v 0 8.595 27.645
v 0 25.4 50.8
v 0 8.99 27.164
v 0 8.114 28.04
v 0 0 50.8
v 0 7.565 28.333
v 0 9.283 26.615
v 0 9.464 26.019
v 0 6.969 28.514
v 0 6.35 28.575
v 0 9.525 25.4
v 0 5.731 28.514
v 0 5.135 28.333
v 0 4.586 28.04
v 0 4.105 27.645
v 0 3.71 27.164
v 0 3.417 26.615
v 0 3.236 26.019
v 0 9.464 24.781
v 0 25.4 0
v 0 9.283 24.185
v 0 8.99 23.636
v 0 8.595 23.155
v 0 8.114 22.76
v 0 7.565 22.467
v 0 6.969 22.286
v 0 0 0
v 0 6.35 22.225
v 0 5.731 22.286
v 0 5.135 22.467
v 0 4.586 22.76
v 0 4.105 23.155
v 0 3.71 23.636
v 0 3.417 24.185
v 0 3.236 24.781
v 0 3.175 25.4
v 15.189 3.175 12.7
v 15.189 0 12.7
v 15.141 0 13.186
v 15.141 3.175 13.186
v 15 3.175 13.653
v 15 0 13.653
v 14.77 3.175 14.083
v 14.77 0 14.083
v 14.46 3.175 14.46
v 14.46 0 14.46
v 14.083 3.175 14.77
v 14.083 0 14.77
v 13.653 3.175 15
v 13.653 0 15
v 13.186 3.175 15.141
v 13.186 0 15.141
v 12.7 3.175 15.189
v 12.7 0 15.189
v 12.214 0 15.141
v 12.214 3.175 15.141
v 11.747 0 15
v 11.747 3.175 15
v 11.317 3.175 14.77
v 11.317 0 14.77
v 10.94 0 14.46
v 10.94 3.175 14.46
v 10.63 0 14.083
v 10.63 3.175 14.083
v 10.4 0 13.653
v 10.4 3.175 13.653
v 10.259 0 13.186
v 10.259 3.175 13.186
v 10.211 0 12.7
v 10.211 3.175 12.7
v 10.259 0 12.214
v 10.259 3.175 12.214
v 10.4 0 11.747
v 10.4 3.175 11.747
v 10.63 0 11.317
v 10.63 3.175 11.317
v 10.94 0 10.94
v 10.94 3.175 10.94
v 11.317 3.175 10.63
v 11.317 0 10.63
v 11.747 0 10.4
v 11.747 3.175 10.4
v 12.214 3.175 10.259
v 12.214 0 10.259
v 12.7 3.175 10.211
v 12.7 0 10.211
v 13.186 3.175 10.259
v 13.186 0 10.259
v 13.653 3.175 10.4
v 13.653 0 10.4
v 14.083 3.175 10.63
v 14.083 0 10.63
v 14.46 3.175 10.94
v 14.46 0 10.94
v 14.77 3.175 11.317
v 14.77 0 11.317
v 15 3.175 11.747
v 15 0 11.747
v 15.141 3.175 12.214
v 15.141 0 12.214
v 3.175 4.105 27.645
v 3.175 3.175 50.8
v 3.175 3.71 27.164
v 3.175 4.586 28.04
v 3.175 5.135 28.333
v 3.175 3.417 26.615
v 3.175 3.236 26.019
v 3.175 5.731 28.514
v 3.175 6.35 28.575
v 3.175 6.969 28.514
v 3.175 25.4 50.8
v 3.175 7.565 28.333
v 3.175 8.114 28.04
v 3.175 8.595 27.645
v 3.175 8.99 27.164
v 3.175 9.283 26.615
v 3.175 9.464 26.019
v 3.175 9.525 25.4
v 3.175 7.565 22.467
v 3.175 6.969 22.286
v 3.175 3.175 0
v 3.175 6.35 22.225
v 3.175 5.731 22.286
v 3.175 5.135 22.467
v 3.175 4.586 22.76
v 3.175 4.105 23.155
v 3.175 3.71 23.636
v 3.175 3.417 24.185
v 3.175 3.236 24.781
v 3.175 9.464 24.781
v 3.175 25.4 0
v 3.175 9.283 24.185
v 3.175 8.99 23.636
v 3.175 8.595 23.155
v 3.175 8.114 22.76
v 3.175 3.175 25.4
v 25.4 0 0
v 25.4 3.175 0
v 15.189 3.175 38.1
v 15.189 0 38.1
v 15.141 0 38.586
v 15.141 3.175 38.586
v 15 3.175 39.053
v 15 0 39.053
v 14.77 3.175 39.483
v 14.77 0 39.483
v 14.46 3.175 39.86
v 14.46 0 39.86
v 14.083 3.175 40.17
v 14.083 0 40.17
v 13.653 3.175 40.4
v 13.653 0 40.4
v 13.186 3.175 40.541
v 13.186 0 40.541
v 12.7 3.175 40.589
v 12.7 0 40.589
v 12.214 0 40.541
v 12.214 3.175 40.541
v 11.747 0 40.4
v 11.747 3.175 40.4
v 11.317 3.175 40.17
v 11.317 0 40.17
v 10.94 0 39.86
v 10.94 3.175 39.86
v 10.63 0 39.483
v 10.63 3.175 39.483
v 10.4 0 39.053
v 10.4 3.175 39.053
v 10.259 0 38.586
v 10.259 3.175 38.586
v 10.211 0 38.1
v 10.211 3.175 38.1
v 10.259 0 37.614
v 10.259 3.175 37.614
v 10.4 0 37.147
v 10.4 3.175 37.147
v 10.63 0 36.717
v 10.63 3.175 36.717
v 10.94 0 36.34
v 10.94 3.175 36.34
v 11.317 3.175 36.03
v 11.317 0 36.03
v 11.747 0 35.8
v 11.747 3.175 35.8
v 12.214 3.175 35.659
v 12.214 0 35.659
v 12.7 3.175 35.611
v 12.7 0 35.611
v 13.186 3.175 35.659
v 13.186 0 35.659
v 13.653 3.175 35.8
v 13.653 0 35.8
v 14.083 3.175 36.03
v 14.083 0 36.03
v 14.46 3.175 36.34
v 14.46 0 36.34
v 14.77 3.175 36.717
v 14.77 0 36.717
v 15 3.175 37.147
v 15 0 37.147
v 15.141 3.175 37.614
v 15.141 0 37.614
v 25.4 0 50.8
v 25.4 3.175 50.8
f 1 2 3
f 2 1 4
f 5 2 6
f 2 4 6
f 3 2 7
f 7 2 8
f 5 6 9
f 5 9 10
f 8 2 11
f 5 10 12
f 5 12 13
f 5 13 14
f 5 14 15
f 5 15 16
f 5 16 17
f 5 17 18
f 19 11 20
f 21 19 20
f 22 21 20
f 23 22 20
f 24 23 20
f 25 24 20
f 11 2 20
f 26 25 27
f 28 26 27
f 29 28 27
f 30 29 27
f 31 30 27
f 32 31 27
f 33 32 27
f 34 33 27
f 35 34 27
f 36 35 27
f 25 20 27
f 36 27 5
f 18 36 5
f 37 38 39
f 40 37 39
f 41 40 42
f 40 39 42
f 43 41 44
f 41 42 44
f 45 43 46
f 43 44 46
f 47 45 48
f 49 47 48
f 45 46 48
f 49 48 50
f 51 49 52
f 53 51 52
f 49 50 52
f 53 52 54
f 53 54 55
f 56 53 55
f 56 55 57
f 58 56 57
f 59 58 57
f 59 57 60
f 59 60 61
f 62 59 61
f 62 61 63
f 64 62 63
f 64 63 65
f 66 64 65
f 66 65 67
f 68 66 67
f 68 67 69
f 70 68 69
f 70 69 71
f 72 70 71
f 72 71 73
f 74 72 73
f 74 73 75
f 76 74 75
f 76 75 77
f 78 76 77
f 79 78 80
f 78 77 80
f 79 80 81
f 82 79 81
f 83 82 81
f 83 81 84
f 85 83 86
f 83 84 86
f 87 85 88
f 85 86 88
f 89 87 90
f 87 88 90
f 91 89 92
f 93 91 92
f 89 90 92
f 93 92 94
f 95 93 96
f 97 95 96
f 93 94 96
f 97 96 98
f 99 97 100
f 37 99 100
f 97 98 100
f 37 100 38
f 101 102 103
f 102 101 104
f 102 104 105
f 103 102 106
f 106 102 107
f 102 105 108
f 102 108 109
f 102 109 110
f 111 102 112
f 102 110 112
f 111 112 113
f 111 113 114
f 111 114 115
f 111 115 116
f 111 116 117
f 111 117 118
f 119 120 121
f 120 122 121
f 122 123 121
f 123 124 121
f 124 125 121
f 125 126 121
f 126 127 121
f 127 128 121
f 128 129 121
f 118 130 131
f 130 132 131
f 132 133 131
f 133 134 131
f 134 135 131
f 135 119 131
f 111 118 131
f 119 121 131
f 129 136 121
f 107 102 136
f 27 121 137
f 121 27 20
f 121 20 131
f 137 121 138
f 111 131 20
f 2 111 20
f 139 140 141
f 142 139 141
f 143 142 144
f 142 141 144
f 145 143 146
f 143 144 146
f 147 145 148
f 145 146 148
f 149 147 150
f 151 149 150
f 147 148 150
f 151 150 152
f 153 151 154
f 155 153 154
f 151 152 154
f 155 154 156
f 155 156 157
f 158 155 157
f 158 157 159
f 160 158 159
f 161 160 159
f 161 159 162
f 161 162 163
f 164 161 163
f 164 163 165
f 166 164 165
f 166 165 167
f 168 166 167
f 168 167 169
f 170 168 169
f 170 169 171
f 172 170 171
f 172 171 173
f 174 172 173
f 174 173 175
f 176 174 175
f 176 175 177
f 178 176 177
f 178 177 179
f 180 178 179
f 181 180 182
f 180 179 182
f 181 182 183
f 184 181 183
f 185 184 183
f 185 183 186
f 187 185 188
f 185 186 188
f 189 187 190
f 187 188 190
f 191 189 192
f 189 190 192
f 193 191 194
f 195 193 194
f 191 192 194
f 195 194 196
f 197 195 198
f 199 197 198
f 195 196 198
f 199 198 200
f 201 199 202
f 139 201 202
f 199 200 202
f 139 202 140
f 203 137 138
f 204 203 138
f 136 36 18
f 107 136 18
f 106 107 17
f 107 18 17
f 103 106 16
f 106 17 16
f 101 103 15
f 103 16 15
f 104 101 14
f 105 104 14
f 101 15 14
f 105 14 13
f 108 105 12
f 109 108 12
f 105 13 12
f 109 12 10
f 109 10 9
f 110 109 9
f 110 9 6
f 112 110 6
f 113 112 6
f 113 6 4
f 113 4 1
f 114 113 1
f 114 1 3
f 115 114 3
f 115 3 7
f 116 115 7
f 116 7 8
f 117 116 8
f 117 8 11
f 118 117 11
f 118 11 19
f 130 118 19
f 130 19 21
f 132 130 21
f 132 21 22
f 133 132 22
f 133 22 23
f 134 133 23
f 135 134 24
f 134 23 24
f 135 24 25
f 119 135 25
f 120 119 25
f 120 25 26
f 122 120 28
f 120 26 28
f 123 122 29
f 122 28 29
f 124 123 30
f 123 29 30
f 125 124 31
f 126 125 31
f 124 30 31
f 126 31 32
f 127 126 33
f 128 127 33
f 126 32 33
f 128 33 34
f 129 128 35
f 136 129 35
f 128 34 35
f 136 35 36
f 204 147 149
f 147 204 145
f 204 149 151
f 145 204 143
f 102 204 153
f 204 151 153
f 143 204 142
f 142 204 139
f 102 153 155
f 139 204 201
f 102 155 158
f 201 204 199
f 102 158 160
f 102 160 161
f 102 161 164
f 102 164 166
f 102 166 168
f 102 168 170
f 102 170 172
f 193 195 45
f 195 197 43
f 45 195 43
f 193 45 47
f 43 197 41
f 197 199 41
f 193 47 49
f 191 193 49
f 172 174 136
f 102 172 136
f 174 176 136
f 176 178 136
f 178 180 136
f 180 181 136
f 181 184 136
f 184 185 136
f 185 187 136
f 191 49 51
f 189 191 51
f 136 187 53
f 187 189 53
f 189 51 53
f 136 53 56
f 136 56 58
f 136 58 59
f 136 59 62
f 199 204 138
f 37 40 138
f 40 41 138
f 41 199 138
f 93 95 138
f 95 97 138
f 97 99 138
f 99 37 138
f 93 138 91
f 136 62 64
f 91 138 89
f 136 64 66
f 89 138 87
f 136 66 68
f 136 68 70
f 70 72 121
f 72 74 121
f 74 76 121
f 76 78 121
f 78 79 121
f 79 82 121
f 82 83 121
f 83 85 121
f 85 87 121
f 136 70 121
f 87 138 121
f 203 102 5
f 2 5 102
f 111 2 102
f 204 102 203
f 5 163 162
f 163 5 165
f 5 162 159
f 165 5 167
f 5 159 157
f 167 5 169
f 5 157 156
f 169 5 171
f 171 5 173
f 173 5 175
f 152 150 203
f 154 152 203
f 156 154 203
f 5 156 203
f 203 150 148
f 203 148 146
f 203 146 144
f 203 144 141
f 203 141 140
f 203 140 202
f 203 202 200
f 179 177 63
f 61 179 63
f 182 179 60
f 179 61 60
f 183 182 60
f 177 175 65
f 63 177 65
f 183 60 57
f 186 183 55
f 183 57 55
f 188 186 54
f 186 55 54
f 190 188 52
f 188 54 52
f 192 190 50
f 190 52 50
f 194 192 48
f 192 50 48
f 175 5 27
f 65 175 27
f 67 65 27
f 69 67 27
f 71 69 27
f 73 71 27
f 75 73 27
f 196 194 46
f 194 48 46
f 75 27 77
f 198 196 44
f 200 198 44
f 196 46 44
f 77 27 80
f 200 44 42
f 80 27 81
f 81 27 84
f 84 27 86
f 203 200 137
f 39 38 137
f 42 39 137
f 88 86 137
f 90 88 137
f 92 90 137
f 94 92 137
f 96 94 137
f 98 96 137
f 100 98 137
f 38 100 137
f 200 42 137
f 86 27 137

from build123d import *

# Parameters (mm, degrees)
F1_DEPTH = 50.8
F2_R     = 2.4892
F3_DEPTH = 25.4
F4_R     = 3.175
F5_DEPTH = 25.4


with BuildPart() as f1:
    # F0 (on Top) → F1 (new body)
    with BuildSketch(Plane.XY):
        Polygon((3.175, 25.4), (0, 25.4), (0, 0), (25.4, 0), (25.4, 3.175), (3.175, 3.175), align=None)
    extrude(amount=F1_DEPTH)

    # F2 (on face) → F3 (cut)
    with BuildSketch(Plane.XZ):
        with Locations((12.7, 38.1)):
            Circle(F2_R)
        with Locations((12.7, 12.7)):
            Circle(F2_R)
    extrude(amount=-F3_DEPTH, mode=Mode.SUBTRACT)

    # F4 (on face) → F5 (cut)
    with BuildSketch(Plane(origin=(0, 0, 0), x_dir=(0, -1, 0), z_dir=(-1, 0, 0))):
        with Locations((-6.35, 25.4)):
            Circle(F4_R)
    extrude(amount=-F5_DEPTH, mode=Mode.SUBTRACT)


solid = f1.part
